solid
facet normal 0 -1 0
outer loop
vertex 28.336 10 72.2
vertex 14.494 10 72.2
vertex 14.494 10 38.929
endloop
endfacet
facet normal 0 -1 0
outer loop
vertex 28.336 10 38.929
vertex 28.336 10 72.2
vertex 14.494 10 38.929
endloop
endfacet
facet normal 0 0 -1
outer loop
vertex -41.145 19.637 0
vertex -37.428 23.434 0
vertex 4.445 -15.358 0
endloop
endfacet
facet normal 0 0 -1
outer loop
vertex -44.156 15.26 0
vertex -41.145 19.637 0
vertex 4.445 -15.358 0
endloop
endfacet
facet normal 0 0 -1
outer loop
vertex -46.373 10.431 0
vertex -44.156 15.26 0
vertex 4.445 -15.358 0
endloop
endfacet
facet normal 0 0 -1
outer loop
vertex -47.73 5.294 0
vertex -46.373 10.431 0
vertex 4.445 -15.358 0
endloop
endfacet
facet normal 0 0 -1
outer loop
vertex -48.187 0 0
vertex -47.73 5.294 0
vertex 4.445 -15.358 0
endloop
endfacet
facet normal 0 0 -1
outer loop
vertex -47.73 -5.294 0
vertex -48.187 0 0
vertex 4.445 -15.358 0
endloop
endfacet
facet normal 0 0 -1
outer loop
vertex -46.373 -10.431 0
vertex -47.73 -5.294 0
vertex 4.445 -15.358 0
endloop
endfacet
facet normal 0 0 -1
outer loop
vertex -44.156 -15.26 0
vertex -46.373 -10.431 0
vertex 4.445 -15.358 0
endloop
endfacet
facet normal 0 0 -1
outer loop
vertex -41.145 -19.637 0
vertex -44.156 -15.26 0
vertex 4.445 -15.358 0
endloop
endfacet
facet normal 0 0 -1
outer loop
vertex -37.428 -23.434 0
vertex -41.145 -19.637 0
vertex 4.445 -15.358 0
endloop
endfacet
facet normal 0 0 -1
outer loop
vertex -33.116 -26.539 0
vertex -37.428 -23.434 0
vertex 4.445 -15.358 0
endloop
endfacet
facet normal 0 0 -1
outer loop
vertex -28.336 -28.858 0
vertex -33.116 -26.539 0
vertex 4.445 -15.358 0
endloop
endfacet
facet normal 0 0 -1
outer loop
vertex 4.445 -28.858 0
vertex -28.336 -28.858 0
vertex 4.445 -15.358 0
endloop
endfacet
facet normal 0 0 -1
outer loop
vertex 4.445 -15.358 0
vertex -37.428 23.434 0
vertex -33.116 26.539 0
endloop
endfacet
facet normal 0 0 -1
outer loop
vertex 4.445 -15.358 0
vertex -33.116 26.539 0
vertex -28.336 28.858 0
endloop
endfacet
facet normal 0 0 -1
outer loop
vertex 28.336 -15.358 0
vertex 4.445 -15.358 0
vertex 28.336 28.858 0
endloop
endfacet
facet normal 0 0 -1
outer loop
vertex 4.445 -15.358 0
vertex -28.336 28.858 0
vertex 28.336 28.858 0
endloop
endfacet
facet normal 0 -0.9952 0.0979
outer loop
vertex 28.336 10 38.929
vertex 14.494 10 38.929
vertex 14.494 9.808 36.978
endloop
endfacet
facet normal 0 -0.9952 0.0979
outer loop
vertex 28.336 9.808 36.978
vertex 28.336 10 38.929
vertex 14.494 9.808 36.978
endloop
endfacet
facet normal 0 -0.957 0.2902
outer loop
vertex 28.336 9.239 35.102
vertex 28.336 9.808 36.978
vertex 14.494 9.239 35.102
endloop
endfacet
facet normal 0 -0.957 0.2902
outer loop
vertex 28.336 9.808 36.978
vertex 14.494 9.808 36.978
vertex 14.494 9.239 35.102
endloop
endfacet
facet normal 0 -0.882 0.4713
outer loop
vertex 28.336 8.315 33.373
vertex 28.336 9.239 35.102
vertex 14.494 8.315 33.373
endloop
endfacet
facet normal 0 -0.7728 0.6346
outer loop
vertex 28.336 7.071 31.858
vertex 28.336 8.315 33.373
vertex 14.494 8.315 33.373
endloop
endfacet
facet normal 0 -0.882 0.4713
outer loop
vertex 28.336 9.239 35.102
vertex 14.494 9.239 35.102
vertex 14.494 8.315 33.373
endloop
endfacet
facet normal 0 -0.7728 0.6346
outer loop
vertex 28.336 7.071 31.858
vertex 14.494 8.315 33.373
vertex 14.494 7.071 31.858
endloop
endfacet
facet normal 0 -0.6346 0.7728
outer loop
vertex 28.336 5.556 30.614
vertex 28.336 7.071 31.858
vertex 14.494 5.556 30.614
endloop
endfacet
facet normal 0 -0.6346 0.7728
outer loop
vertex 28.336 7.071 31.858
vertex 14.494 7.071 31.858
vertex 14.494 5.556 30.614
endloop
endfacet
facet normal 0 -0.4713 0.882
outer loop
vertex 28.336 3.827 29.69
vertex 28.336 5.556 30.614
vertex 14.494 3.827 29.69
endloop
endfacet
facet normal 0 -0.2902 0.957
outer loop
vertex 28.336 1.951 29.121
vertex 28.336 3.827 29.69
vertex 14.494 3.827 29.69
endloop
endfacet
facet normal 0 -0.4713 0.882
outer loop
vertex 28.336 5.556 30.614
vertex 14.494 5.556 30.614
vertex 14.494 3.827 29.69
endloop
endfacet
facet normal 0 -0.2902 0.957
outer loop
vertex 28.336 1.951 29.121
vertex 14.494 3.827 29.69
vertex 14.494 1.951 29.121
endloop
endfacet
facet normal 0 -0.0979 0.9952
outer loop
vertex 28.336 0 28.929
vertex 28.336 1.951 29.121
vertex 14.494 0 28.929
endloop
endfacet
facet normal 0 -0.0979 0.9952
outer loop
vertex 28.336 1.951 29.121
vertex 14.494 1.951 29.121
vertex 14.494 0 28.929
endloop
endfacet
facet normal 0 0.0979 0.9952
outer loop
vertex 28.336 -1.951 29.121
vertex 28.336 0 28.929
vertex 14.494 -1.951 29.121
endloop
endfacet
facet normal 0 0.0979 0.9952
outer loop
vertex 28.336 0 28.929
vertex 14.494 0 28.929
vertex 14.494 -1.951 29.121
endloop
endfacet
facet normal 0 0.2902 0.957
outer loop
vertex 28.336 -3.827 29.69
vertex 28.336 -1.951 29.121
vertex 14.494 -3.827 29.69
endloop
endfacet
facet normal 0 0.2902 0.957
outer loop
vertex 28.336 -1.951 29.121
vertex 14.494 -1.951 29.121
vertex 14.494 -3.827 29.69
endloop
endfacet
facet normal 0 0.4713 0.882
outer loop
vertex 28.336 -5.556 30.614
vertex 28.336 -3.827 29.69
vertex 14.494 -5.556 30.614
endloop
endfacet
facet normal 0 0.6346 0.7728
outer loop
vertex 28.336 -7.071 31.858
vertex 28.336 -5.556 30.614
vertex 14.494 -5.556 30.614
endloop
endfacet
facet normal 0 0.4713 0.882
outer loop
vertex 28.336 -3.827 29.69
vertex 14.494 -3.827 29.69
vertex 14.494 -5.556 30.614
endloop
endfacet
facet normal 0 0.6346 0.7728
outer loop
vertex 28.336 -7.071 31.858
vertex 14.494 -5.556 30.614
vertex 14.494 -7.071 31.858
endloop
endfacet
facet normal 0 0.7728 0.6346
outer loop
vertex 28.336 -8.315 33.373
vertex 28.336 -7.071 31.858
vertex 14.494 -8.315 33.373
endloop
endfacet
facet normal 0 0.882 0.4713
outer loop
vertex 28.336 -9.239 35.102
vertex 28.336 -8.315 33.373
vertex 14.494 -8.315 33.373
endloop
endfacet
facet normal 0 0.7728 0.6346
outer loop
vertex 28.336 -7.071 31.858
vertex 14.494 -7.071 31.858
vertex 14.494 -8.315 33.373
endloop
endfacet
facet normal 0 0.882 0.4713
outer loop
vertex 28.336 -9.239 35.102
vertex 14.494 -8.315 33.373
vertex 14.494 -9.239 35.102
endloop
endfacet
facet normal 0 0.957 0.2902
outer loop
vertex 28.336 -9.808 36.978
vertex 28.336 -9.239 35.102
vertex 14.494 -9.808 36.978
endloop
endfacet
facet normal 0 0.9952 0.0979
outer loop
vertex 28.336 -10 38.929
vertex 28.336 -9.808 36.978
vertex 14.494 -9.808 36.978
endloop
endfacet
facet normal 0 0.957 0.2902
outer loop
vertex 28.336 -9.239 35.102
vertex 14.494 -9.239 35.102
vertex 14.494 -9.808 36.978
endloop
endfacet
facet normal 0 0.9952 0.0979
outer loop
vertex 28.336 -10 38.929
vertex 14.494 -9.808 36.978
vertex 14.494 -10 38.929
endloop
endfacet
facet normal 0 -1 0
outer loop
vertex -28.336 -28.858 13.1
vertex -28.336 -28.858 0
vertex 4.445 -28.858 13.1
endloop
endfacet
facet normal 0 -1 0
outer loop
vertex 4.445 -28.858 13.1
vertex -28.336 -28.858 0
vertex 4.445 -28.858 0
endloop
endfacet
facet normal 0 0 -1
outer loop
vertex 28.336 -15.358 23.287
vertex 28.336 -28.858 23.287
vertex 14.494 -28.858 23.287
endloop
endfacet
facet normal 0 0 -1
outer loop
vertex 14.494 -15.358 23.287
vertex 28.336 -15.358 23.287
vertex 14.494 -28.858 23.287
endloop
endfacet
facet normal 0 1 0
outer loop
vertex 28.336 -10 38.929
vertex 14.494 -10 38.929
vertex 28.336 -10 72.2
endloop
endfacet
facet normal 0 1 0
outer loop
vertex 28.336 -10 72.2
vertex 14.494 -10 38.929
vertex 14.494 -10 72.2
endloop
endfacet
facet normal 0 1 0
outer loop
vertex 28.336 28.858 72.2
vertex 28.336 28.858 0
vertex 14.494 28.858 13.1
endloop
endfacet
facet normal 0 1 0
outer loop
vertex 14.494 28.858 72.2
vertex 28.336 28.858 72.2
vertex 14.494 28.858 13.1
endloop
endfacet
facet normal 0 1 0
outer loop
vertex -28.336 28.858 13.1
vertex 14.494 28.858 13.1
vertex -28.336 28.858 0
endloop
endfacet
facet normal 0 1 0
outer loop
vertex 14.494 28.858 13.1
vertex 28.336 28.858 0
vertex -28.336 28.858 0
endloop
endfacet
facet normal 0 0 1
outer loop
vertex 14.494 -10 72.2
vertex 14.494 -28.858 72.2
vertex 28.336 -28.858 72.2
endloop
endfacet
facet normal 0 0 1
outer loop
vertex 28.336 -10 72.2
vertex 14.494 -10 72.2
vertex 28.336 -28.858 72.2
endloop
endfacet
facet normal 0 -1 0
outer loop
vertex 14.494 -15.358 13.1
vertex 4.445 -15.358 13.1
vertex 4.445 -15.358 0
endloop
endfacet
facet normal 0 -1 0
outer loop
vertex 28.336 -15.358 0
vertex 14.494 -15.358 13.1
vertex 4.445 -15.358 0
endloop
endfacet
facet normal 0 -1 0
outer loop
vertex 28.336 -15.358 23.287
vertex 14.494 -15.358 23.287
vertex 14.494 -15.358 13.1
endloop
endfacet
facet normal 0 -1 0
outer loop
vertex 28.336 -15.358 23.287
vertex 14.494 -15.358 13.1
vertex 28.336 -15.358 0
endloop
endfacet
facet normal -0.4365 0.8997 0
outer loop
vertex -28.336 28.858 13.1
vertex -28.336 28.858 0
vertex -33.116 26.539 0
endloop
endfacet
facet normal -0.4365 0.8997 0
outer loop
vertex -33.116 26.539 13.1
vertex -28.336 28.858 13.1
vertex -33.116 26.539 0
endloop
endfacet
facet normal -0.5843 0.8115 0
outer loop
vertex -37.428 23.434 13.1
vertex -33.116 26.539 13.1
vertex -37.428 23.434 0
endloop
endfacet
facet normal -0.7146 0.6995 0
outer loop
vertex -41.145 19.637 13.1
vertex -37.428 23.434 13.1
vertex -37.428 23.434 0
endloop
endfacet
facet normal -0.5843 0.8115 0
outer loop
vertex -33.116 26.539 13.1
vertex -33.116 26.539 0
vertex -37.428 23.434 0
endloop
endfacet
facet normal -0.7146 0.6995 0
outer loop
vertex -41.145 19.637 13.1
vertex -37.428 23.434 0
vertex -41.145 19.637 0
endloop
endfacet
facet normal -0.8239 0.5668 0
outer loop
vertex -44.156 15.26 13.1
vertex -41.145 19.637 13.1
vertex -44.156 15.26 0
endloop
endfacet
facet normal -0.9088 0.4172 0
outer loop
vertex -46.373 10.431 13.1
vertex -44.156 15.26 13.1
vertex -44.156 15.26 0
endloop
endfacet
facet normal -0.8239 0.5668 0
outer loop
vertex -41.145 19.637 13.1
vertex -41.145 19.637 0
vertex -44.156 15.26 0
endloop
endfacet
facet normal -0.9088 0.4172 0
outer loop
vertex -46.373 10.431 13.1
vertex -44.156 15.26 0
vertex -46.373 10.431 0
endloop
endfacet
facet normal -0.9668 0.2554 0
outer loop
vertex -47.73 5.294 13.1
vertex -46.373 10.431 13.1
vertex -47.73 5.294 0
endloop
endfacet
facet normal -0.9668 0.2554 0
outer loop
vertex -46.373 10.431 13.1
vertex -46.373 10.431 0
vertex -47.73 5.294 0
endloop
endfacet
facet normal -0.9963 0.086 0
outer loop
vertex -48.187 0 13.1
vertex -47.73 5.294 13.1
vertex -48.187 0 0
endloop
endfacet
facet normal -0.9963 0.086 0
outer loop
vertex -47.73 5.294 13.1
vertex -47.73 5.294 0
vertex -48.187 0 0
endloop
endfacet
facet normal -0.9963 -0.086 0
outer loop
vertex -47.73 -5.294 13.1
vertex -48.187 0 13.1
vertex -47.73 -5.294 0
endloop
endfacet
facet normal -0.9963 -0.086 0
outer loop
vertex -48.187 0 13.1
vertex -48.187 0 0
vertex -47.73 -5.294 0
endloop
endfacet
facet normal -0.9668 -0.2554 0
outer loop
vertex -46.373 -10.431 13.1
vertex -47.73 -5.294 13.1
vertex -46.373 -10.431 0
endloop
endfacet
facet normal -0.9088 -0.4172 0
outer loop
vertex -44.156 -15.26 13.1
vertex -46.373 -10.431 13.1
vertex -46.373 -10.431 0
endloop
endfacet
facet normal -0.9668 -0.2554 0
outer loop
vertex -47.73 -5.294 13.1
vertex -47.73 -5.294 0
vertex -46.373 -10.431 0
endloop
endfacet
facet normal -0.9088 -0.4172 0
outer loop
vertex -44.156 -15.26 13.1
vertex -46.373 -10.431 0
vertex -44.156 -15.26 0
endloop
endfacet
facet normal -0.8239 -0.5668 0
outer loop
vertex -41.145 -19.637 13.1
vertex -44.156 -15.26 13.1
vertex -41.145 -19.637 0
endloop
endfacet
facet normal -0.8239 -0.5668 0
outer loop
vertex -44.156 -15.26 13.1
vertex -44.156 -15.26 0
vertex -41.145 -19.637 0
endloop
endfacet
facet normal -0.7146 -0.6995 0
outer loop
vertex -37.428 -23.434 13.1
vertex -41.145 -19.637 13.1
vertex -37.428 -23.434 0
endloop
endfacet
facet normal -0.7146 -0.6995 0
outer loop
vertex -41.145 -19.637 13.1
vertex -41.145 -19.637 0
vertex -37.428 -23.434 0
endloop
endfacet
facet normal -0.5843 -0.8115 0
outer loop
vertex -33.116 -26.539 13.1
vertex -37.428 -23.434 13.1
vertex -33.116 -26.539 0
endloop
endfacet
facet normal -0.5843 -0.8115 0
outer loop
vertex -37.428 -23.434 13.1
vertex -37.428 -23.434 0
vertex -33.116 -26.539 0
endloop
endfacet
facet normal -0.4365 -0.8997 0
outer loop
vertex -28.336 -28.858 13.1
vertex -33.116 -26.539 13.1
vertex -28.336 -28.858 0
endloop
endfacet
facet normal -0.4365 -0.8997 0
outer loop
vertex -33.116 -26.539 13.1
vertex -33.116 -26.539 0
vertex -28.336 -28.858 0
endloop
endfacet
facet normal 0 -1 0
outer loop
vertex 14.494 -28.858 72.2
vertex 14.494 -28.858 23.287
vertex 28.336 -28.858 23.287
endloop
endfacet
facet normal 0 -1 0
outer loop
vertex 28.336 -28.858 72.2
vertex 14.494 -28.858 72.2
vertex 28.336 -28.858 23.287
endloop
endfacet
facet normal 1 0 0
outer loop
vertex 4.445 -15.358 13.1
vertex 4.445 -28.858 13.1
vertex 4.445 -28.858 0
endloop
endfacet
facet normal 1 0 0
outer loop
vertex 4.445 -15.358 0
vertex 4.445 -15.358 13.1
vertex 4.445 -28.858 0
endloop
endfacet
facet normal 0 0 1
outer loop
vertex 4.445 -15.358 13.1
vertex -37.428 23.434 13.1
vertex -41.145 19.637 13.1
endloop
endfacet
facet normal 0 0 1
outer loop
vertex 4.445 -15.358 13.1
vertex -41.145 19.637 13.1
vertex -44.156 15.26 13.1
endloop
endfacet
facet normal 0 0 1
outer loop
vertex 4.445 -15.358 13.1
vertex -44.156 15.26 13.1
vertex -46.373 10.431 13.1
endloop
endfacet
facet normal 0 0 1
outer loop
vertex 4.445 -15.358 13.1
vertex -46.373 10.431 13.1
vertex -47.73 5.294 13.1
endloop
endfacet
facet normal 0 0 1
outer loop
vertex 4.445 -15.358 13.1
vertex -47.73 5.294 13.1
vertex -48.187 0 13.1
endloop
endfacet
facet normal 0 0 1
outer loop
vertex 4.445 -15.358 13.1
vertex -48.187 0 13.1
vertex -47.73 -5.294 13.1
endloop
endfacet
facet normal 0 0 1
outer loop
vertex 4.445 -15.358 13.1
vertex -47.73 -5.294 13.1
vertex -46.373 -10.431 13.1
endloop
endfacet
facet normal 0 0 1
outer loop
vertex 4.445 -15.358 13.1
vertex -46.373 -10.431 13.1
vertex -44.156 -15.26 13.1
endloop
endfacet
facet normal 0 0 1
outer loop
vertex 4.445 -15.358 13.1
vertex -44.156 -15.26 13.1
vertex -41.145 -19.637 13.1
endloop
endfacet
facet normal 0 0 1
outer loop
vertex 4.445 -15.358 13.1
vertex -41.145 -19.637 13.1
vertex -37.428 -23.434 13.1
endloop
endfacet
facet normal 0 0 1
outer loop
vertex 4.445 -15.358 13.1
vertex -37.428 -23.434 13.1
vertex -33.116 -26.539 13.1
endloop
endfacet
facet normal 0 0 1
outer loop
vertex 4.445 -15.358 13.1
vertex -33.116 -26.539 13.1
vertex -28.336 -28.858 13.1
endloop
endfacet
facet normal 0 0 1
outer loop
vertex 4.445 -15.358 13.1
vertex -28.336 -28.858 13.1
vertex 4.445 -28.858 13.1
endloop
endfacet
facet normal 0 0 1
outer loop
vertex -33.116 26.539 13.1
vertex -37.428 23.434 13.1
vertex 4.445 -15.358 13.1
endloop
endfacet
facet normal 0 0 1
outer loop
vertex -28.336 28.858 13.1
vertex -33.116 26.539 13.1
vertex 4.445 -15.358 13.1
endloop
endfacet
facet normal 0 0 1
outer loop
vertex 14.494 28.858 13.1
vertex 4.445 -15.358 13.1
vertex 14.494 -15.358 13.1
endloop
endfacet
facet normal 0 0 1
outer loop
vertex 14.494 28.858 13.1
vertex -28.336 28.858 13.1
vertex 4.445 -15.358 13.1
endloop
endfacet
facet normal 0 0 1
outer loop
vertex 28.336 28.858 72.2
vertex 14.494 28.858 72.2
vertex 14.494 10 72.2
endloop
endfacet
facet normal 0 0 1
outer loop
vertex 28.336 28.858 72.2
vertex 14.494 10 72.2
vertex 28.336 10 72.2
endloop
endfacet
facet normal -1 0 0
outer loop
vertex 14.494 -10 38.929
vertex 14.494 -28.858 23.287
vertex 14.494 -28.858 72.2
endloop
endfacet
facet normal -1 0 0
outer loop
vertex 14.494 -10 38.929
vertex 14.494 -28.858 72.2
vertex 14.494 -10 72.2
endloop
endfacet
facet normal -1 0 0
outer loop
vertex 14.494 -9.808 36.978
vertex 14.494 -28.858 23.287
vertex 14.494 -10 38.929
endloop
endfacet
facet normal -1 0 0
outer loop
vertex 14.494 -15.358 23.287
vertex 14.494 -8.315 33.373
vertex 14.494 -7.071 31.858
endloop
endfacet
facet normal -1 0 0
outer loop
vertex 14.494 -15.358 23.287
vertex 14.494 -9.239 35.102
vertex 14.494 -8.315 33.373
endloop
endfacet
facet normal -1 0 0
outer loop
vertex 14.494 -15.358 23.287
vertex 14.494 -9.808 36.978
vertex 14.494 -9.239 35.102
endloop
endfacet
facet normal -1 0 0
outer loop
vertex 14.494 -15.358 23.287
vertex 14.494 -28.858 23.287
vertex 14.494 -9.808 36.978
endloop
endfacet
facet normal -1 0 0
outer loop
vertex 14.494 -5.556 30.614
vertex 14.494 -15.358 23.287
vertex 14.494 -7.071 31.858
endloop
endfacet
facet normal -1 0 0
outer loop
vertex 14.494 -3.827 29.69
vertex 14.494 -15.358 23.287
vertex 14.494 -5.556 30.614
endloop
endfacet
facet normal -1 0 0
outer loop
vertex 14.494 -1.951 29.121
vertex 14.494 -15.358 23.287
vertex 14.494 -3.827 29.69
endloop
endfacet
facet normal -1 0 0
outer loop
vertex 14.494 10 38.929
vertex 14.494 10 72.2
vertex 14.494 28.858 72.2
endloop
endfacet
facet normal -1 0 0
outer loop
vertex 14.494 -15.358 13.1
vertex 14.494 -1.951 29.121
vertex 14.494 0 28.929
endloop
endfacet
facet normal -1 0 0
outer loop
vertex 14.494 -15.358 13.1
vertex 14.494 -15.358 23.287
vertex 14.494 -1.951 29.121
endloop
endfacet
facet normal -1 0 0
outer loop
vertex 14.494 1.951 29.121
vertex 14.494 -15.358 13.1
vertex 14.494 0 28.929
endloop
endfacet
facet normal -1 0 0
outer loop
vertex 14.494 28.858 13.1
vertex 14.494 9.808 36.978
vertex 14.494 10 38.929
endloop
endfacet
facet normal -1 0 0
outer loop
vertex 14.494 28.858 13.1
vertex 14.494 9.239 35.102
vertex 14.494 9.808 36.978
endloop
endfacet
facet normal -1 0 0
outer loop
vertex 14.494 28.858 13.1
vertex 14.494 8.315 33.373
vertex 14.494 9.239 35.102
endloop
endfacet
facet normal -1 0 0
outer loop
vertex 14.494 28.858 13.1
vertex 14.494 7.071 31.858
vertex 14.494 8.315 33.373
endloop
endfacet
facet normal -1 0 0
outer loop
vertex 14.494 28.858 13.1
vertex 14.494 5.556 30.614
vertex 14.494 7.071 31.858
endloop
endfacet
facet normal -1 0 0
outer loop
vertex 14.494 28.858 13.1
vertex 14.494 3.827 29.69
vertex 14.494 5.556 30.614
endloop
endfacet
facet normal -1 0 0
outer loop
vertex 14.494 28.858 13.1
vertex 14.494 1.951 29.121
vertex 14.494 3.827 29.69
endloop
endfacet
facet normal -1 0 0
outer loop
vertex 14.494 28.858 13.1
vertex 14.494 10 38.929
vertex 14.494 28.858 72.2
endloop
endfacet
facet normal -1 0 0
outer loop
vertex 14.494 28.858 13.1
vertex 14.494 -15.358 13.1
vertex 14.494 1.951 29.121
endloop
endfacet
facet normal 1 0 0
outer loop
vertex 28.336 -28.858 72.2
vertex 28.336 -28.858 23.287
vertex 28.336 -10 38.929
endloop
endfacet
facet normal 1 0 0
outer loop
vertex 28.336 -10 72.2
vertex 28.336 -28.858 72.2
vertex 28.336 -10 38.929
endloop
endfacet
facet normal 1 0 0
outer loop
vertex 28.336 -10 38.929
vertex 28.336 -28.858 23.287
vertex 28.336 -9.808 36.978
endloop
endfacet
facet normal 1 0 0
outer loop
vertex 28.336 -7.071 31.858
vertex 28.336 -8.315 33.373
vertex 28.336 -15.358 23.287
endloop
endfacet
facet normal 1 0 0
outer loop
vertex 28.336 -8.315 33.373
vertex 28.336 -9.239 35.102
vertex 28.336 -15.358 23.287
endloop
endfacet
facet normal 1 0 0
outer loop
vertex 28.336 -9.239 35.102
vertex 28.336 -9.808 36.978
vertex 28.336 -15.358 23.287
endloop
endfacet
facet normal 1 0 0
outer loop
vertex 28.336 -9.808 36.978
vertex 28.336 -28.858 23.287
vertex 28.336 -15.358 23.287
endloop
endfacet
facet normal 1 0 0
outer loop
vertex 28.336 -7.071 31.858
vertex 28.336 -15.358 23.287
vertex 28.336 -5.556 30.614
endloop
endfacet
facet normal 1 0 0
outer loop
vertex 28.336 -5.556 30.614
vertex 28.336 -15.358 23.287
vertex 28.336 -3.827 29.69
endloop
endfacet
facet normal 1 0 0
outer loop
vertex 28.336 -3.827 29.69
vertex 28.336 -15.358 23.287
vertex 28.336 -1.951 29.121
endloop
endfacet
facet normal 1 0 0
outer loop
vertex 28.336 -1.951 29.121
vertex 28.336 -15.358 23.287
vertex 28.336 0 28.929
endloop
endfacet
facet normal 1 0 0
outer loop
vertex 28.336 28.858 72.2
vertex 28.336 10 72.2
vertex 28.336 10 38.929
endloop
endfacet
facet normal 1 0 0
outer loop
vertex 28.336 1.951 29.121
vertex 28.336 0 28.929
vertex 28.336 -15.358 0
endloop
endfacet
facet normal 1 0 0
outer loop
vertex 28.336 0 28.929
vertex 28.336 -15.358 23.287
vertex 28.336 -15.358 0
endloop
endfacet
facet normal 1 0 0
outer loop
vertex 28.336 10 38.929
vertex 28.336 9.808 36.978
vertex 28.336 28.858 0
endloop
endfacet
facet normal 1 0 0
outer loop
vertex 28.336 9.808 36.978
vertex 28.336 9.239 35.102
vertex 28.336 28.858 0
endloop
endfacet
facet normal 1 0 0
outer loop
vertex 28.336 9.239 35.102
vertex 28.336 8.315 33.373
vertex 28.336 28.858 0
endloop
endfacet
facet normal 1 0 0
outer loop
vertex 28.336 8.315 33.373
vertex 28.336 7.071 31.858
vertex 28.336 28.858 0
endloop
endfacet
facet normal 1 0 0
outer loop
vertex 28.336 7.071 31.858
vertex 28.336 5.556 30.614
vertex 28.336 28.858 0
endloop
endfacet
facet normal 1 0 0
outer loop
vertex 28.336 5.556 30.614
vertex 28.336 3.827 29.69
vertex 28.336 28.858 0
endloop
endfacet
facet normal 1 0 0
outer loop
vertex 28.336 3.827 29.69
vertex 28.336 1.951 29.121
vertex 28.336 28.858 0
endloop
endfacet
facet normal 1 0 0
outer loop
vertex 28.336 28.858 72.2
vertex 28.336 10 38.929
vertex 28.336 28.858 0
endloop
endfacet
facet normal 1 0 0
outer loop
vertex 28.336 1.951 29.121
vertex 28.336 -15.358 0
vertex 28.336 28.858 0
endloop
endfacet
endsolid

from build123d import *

# Parameters (mm, degrees)
F0_W     = 13.8414949179
F0_H     = 57.7164180577
F1_DEPTH = 13.1
F2_DEPTH = 72.2
F4_DEPTH = 13.8424949179
F6_DEPTH = 13.5


with BuildPart() as f1:
    # F0 (on Top) → F1 (new body)
    with BuildSketch(Plane.XY):
        with Locations((21.4151442051, 0)):
            Rectangle(F0_W, F0_H)
        with BuildLine():
            Line((-28.335891664, -28.8582090288), (14.4943967462, -28.8582090288))
            Line((14.4943967462, -28.8582090288), (14.4943967462, 28.8582090288))
            Line((14.4943967462, 28.8582090288), (-28.335891664, 28.8582090288))
            ThreePointArc((-28.335891664, 28.8582090288), (-48.1865539217, 0), (-28.335891664, -28.8582090288))
        make_face()
    extrude(amount=F1_DEPTH)

    # F0 (on Top) → F2 (join)
    with BuildSketch(Plane.XY):
        with Locations((21.4151442051, 0)):
            Rectangle(F0_W, F0_H)
    extrude(amount=F2_DEPTH)

    # F3 (on face) → F4 (cut, through all)
    with BuildSketch(Plane(origin=(14.4943967462, 0, 0), x_dir=(0, -1, 0), z_dir=(-1, 0, 0))):
        with BuildLine():
            Line((10, 72.2), (-10, 72.2))
            Line((-10, 72.2), (-10, 38.9287173748))
            ThreePointArc((-10, 38.9287173748), (0, 28.9287173748), (10, 38.9287173748))
            Line((10, 38.9287173748), (10, 72.2))
        make_face()
        with BuildLine():
            ThreePointArc((10, 72.2), (0, 82.2), (-10, 72.2))
            Line((-10, 72.2), (10, 72.2))
        make_face()
    extrude(amount=-F4_DEPTH, mode=Mode.SUBTRACT)

    # F5 (on face) → F6 (cut)
    with BuildSketch(Plane.XZ.offset(28.8582090288)):
        Polygon((28.335891664, 23.2873037457), (14.4943967462, 23.2873037457), (14.4943967462, 13.1), (4.4452203438, 13.1), (4.4452203438, 0), (28.335891664, 0), align=None)
    extrude(amount=-F6_DEPTH, mode=Mode.SUBTRACT)


solid = f1.part
